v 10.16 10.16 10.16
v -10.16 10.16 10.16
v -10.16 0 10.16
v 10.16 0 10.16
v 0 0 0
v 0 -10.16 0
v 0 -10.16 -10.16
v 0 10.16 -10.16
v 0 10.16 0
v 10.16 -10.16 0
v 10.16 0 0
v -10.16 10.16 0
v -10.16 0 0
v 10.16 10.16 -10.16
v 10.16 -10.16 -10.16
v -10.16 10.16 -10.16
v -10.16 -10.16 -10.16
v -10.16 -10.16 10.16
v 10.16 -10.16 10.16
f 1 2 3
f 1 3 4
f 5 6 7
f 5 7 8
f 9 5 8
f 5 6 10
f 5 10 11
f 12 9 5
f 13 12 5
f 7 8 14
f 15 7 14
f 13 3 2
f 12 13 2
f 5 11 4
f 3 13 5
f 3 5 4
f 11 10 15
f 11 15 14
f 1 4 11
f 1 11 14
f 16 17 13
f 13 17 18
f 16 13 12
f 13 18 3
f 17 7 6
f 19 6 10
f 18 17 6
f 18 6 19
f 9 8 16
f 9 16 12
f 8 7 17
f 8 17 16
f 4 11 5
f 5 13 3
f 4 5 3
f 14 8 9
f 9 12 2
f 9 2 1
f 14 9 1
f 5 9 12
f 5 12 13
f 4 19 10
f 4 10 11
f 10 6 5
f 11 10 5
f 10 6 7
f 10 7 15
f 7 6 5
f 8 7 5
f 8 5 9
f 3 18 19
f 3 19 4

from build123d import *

# Parameters (mm, degrees)
F2_DEPTH      = 10.16
F3_W          = 10.16
F3_H          = 10.16
F4_DEPTH      = 10.16
F5_W          = 20.32
F5_H          = 20.32
F6_DEPTH      = 10.16
F6_DEPTH_BACK = 10.16


# Not quite as in the source:
# - a variable given as a bare number and used for a length is read in inches; the dataset says mm whatever the document's units were


with BuildPart() as f2:
    # F1 (on Right) → F2 (new body)
    with BuildSketch(Plane.YZ):
        Polygon((10.16, 0), (0, 0), (0, 10.16), (-10.16, 10.16), (-10.16, -10.16), (10.16, -10.16), align=None)
    extrude(amount=-F2_DEPTH)

    # F3 (on face) → F4 (join)
    with BuildSketch(Plane.YZ):
        with Locations((-5.08, 5.08)):
            Rectangle(F3_W, F3_H)
    extrude(amount=F4_DEPTH)


with BuildPart() as f6:
    # F5 (on Top) → F6 (new body, two sides)
    with BuildSketch(Plane.XY) as f6_sk:
        Rectangle(F5_W, F5_H)
    extrude(amount=F6_DEPTH)
    extrude(f6_sk.sketch, amount=-F6_DEPTH_BACK)

    # F7: cut F2
    add(f2.part, mode=Mode.SUBTRACT)


solid = Compound([f2.part, f6.part])
